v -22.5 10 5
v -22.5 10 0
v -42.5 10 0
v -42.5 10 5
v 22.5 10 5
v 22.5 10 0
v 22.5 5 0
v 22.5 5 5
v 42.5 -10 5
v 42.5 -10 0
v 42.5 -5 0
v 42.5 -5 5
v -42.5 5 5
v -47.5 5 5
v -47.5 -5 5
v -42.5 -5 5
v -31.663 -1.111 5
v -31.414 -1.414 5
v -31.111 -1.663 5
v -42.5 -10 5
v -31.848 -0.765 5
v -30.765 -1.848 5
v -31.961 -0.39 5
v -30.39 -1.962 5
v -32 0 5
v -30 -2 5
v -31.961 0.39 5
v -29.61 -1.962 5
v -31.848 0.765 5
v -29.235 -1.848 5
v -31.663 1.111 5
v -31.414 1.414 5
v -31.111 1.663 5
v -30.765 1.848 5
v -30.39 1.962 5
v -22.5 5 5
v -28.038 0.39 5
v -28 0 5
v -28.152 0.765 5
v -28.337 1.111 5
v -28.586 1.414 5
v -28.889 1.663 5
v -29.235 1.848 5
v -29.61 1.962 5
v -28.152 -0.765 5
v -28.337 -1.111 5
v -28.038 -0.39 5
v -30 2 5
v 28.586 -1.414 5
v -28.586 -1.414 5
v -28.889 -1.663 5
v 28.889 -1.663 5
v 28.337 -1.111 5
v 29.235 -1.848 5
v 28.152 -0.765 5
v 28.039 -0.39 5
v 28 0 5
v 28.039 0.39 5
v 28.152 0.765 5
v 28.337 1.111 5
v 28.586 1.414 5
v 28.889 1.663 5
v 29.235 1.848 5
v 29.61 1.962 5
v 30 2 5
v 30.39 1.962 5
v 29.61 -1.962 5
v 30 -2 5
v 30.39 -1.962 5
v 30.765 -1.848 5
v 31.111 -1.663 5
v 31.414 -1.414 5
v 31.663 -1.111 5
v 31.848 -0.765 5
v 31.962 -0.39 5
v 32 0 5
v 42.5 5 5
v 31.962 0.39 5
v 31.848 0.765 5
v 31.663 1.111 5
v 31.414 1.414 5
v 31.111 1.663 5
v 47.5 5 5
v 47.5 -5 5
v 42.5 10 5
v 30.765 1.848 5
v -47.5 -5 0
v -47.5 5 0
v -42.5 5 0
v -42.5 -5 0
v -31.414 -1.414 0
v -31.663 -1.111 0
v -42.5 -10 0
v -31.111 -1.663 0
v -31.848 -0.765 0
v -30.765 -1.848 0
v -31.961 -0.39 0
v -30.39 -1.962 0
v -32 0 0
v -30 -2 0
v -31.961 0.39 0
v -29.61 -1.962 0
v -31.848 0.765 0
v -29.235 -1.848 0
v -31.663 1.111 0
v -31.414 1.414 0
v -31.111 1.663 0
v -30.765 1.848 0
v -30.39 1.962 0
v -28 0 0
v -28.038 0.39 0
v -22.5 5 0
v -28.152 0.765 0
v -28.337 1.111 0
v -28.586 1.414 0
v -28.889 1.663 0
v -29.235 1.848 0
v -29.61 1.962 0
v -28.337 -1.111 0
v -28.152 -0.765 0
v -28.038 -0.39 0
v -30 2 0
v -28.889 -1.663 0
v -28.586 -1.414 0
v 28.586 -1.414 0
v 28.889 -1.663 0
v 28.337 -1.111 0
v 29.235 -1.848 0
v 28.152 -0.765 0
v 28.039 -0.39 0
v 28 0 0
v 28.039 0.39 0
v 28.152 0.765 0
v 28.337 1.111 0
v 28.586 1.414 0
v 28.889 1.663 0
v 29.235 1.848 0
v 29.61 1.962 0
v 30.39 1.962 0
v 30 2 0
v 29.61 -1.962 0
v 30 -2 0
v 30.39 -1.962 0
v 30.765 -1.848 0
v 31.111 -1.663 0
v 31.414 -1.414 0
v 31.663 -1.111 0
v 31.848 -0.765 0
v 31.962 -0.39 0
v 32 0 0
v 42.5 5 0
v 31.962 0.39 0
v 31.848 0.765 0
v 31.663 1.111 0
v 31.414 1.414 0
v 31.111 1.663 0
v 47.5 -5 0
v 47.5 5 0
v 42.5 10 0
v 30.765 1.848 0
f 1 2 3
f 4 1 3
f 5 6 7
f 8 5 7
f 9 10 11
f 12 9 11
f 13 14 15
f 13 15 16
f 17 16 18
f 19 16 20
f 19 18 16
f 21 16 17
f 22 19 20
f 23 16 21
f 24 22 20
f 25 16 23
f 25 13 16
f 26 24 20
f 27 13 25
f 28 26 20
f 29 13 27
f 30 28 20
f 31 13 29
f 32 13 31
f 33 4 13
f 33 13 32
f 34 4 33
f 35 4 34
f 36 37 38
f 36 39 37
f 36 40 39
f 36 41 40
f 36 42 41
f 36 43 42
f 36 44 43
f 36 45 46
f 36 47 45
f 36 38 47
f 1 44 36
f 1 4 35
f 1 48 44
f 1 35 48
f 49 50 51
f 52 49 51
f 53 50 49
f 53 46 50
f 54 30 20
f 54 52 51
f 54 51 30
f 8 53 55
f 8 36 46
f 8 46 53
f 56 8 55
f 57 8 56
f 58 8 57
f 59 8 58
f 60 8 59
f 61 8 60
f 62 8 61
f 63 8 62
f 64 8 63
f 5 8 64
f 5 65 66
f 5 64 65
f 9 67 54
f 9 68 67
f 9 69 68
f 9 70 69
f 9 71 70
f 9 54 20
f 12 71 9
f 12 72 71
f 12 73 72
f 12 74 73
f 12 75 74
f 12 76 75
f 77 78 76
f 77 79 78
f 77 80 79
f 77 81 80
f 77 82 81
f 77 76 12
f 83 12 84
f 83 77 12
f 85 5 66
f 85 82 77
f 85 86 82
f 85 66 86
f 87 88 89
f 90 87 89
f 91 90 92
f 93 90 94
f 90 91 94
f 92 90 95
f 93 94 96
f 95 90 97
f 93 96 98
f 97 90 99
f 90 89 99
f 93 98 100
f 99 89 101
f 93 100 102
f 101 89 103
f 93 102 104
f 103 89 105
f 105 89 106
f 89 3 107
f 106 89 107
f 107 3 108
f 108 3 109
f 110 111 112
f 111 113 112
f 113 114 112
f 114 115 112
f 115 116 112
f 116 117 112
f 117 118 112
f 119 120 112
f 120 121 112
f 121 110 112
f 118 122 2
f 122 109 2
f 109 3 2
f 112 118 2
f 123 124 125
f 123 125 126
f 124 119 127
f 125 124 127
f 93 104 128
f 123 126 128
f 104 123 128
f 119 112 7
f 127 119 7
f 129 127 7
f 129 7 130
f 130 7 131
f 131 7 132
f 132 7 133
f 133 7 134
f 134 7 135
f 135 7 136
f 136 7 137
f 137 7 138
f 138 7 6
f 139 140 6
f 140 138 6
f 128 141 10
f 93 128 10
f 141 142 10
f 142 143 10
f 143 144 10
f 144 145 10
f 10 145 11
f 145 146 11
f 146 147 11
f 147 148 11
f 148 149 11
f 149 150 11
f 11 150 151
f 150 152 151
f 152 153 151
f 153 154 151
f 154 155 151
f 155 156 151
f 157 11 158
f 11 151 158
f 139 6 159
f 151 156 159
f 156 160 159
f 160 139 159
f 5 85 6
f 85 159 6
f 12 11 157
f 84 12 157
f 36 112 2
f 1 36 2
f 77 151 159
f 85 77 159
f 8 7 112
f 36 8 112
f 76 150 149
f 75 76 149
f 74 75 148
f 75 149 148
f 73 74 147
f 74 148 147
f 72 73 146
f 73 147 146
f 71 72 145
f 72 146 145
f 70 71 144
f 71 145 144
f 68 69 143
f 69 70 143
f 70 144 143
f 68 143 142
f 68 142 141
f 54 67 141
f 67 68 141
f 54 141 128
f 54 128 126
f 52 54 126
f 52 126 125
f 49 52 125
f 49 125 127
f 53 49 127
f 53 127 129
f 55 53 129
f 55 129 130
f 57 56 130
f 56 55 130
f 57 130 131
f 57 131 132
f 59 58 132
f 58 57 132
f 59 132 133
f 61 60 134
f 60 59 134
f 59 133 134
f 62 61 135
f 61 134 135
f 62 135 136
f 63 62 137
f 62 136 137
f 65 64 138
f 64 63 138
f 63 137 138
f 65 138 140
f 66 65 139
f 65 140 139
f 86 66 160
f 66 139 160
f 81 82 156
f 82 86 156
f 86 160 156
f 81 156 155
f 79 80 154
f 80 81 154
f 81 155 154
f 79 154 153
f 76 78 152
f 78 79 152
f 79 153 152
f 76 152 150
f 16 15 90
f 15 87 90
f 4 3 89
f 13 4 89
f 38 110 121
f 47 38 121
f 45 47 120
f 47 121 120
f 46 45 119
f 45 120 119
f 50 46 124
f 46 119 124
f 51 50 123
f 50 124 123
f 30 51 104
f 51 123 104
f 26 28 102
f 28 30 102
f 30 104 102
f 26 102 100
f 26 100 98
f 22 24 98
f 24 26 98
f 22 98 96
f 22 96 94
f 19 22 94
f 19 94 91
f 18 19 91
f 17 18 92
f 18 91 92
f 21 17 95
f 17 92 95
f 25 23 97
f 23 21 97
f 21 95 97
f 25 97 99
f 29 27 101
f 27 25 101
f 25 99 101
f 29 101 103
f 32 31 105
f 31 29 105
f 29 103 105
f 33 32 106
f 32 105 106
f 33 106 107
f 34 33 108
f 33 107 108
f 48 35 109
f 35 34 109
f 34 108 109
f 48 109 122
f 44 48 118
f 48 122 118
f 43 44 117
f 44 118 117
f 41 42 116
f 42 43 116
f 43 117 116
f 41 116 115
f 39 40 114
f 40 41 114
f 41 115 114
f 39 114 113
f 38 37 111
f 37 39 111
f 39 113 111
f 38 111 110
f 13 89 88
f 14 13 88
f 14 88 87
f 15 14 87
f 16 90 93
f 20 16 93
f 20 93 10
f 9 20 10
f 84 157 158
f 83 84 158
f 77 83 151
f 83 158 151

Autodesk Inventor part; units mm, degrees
ref_plane "YZ Plane" through (0, 0, 0) normal (1, 0, 0) x (0, 1, 0)
ref_plane "XZ Plane" through (0, 0, 0) normal (0, 1, 0) x (-1, 0, 0)
ref_plane "XY Plane" through (0, 0, 0) normal (0, 0, 1) x (1, 0, 0)
sketch "Sketch1" plane through (0.0001, 0, 0) normal (0, 0, 1) x (1, 0, 0)
  line L0 (47.5003, -5) -> (47.5003, 4.9999)
  line L1 (47.5003, 4.9999) -> (42.5003, 4.9999)
  line L2 (42.5003, 4.9999) -> (42.5003, 9.9999)
  line L3 (42.5003, 9.9999) -> (22.4998, 10)
  line L4 (22.4998, 10) -> (22.4998, 5)
  line L5 (22.4998, 5) -> (-22.5002, 5)
  line L6 (-22.5002, 5) -> (-22.5002, 10)
  line L7 (-22.5002, 10) -> (-42.5005, 10)
  line L8 (-42.5005, 10) -> (-42.5003, 5)
  line L9 (-42.5003, 5) -> (-47.5003, 4.9999)
  line L10 (-47.5003, 4.9999) -> (-47.5, -5)
  line L11 (-47.5, -5) -> (-42.5, -4.9999)
  line L12 (-42.5, -4.9999) -> (-42.4999, -10)
  line L13 (-42.4999, -10) -> (42.5003, -10)
  line L14 (42.5003, -10) -> (42.5003, -5)
  line L15 (42.5003, -5) -> (47.5003, -5)
  circle A0 centre (-30, 0) radius 2
  circle A1 centre (30, 0) radius 2
  point P0 (-0.0005, 0)
extrude "AP" add sketch "Sketch1" along normal blind 5
properties part number "AP"
